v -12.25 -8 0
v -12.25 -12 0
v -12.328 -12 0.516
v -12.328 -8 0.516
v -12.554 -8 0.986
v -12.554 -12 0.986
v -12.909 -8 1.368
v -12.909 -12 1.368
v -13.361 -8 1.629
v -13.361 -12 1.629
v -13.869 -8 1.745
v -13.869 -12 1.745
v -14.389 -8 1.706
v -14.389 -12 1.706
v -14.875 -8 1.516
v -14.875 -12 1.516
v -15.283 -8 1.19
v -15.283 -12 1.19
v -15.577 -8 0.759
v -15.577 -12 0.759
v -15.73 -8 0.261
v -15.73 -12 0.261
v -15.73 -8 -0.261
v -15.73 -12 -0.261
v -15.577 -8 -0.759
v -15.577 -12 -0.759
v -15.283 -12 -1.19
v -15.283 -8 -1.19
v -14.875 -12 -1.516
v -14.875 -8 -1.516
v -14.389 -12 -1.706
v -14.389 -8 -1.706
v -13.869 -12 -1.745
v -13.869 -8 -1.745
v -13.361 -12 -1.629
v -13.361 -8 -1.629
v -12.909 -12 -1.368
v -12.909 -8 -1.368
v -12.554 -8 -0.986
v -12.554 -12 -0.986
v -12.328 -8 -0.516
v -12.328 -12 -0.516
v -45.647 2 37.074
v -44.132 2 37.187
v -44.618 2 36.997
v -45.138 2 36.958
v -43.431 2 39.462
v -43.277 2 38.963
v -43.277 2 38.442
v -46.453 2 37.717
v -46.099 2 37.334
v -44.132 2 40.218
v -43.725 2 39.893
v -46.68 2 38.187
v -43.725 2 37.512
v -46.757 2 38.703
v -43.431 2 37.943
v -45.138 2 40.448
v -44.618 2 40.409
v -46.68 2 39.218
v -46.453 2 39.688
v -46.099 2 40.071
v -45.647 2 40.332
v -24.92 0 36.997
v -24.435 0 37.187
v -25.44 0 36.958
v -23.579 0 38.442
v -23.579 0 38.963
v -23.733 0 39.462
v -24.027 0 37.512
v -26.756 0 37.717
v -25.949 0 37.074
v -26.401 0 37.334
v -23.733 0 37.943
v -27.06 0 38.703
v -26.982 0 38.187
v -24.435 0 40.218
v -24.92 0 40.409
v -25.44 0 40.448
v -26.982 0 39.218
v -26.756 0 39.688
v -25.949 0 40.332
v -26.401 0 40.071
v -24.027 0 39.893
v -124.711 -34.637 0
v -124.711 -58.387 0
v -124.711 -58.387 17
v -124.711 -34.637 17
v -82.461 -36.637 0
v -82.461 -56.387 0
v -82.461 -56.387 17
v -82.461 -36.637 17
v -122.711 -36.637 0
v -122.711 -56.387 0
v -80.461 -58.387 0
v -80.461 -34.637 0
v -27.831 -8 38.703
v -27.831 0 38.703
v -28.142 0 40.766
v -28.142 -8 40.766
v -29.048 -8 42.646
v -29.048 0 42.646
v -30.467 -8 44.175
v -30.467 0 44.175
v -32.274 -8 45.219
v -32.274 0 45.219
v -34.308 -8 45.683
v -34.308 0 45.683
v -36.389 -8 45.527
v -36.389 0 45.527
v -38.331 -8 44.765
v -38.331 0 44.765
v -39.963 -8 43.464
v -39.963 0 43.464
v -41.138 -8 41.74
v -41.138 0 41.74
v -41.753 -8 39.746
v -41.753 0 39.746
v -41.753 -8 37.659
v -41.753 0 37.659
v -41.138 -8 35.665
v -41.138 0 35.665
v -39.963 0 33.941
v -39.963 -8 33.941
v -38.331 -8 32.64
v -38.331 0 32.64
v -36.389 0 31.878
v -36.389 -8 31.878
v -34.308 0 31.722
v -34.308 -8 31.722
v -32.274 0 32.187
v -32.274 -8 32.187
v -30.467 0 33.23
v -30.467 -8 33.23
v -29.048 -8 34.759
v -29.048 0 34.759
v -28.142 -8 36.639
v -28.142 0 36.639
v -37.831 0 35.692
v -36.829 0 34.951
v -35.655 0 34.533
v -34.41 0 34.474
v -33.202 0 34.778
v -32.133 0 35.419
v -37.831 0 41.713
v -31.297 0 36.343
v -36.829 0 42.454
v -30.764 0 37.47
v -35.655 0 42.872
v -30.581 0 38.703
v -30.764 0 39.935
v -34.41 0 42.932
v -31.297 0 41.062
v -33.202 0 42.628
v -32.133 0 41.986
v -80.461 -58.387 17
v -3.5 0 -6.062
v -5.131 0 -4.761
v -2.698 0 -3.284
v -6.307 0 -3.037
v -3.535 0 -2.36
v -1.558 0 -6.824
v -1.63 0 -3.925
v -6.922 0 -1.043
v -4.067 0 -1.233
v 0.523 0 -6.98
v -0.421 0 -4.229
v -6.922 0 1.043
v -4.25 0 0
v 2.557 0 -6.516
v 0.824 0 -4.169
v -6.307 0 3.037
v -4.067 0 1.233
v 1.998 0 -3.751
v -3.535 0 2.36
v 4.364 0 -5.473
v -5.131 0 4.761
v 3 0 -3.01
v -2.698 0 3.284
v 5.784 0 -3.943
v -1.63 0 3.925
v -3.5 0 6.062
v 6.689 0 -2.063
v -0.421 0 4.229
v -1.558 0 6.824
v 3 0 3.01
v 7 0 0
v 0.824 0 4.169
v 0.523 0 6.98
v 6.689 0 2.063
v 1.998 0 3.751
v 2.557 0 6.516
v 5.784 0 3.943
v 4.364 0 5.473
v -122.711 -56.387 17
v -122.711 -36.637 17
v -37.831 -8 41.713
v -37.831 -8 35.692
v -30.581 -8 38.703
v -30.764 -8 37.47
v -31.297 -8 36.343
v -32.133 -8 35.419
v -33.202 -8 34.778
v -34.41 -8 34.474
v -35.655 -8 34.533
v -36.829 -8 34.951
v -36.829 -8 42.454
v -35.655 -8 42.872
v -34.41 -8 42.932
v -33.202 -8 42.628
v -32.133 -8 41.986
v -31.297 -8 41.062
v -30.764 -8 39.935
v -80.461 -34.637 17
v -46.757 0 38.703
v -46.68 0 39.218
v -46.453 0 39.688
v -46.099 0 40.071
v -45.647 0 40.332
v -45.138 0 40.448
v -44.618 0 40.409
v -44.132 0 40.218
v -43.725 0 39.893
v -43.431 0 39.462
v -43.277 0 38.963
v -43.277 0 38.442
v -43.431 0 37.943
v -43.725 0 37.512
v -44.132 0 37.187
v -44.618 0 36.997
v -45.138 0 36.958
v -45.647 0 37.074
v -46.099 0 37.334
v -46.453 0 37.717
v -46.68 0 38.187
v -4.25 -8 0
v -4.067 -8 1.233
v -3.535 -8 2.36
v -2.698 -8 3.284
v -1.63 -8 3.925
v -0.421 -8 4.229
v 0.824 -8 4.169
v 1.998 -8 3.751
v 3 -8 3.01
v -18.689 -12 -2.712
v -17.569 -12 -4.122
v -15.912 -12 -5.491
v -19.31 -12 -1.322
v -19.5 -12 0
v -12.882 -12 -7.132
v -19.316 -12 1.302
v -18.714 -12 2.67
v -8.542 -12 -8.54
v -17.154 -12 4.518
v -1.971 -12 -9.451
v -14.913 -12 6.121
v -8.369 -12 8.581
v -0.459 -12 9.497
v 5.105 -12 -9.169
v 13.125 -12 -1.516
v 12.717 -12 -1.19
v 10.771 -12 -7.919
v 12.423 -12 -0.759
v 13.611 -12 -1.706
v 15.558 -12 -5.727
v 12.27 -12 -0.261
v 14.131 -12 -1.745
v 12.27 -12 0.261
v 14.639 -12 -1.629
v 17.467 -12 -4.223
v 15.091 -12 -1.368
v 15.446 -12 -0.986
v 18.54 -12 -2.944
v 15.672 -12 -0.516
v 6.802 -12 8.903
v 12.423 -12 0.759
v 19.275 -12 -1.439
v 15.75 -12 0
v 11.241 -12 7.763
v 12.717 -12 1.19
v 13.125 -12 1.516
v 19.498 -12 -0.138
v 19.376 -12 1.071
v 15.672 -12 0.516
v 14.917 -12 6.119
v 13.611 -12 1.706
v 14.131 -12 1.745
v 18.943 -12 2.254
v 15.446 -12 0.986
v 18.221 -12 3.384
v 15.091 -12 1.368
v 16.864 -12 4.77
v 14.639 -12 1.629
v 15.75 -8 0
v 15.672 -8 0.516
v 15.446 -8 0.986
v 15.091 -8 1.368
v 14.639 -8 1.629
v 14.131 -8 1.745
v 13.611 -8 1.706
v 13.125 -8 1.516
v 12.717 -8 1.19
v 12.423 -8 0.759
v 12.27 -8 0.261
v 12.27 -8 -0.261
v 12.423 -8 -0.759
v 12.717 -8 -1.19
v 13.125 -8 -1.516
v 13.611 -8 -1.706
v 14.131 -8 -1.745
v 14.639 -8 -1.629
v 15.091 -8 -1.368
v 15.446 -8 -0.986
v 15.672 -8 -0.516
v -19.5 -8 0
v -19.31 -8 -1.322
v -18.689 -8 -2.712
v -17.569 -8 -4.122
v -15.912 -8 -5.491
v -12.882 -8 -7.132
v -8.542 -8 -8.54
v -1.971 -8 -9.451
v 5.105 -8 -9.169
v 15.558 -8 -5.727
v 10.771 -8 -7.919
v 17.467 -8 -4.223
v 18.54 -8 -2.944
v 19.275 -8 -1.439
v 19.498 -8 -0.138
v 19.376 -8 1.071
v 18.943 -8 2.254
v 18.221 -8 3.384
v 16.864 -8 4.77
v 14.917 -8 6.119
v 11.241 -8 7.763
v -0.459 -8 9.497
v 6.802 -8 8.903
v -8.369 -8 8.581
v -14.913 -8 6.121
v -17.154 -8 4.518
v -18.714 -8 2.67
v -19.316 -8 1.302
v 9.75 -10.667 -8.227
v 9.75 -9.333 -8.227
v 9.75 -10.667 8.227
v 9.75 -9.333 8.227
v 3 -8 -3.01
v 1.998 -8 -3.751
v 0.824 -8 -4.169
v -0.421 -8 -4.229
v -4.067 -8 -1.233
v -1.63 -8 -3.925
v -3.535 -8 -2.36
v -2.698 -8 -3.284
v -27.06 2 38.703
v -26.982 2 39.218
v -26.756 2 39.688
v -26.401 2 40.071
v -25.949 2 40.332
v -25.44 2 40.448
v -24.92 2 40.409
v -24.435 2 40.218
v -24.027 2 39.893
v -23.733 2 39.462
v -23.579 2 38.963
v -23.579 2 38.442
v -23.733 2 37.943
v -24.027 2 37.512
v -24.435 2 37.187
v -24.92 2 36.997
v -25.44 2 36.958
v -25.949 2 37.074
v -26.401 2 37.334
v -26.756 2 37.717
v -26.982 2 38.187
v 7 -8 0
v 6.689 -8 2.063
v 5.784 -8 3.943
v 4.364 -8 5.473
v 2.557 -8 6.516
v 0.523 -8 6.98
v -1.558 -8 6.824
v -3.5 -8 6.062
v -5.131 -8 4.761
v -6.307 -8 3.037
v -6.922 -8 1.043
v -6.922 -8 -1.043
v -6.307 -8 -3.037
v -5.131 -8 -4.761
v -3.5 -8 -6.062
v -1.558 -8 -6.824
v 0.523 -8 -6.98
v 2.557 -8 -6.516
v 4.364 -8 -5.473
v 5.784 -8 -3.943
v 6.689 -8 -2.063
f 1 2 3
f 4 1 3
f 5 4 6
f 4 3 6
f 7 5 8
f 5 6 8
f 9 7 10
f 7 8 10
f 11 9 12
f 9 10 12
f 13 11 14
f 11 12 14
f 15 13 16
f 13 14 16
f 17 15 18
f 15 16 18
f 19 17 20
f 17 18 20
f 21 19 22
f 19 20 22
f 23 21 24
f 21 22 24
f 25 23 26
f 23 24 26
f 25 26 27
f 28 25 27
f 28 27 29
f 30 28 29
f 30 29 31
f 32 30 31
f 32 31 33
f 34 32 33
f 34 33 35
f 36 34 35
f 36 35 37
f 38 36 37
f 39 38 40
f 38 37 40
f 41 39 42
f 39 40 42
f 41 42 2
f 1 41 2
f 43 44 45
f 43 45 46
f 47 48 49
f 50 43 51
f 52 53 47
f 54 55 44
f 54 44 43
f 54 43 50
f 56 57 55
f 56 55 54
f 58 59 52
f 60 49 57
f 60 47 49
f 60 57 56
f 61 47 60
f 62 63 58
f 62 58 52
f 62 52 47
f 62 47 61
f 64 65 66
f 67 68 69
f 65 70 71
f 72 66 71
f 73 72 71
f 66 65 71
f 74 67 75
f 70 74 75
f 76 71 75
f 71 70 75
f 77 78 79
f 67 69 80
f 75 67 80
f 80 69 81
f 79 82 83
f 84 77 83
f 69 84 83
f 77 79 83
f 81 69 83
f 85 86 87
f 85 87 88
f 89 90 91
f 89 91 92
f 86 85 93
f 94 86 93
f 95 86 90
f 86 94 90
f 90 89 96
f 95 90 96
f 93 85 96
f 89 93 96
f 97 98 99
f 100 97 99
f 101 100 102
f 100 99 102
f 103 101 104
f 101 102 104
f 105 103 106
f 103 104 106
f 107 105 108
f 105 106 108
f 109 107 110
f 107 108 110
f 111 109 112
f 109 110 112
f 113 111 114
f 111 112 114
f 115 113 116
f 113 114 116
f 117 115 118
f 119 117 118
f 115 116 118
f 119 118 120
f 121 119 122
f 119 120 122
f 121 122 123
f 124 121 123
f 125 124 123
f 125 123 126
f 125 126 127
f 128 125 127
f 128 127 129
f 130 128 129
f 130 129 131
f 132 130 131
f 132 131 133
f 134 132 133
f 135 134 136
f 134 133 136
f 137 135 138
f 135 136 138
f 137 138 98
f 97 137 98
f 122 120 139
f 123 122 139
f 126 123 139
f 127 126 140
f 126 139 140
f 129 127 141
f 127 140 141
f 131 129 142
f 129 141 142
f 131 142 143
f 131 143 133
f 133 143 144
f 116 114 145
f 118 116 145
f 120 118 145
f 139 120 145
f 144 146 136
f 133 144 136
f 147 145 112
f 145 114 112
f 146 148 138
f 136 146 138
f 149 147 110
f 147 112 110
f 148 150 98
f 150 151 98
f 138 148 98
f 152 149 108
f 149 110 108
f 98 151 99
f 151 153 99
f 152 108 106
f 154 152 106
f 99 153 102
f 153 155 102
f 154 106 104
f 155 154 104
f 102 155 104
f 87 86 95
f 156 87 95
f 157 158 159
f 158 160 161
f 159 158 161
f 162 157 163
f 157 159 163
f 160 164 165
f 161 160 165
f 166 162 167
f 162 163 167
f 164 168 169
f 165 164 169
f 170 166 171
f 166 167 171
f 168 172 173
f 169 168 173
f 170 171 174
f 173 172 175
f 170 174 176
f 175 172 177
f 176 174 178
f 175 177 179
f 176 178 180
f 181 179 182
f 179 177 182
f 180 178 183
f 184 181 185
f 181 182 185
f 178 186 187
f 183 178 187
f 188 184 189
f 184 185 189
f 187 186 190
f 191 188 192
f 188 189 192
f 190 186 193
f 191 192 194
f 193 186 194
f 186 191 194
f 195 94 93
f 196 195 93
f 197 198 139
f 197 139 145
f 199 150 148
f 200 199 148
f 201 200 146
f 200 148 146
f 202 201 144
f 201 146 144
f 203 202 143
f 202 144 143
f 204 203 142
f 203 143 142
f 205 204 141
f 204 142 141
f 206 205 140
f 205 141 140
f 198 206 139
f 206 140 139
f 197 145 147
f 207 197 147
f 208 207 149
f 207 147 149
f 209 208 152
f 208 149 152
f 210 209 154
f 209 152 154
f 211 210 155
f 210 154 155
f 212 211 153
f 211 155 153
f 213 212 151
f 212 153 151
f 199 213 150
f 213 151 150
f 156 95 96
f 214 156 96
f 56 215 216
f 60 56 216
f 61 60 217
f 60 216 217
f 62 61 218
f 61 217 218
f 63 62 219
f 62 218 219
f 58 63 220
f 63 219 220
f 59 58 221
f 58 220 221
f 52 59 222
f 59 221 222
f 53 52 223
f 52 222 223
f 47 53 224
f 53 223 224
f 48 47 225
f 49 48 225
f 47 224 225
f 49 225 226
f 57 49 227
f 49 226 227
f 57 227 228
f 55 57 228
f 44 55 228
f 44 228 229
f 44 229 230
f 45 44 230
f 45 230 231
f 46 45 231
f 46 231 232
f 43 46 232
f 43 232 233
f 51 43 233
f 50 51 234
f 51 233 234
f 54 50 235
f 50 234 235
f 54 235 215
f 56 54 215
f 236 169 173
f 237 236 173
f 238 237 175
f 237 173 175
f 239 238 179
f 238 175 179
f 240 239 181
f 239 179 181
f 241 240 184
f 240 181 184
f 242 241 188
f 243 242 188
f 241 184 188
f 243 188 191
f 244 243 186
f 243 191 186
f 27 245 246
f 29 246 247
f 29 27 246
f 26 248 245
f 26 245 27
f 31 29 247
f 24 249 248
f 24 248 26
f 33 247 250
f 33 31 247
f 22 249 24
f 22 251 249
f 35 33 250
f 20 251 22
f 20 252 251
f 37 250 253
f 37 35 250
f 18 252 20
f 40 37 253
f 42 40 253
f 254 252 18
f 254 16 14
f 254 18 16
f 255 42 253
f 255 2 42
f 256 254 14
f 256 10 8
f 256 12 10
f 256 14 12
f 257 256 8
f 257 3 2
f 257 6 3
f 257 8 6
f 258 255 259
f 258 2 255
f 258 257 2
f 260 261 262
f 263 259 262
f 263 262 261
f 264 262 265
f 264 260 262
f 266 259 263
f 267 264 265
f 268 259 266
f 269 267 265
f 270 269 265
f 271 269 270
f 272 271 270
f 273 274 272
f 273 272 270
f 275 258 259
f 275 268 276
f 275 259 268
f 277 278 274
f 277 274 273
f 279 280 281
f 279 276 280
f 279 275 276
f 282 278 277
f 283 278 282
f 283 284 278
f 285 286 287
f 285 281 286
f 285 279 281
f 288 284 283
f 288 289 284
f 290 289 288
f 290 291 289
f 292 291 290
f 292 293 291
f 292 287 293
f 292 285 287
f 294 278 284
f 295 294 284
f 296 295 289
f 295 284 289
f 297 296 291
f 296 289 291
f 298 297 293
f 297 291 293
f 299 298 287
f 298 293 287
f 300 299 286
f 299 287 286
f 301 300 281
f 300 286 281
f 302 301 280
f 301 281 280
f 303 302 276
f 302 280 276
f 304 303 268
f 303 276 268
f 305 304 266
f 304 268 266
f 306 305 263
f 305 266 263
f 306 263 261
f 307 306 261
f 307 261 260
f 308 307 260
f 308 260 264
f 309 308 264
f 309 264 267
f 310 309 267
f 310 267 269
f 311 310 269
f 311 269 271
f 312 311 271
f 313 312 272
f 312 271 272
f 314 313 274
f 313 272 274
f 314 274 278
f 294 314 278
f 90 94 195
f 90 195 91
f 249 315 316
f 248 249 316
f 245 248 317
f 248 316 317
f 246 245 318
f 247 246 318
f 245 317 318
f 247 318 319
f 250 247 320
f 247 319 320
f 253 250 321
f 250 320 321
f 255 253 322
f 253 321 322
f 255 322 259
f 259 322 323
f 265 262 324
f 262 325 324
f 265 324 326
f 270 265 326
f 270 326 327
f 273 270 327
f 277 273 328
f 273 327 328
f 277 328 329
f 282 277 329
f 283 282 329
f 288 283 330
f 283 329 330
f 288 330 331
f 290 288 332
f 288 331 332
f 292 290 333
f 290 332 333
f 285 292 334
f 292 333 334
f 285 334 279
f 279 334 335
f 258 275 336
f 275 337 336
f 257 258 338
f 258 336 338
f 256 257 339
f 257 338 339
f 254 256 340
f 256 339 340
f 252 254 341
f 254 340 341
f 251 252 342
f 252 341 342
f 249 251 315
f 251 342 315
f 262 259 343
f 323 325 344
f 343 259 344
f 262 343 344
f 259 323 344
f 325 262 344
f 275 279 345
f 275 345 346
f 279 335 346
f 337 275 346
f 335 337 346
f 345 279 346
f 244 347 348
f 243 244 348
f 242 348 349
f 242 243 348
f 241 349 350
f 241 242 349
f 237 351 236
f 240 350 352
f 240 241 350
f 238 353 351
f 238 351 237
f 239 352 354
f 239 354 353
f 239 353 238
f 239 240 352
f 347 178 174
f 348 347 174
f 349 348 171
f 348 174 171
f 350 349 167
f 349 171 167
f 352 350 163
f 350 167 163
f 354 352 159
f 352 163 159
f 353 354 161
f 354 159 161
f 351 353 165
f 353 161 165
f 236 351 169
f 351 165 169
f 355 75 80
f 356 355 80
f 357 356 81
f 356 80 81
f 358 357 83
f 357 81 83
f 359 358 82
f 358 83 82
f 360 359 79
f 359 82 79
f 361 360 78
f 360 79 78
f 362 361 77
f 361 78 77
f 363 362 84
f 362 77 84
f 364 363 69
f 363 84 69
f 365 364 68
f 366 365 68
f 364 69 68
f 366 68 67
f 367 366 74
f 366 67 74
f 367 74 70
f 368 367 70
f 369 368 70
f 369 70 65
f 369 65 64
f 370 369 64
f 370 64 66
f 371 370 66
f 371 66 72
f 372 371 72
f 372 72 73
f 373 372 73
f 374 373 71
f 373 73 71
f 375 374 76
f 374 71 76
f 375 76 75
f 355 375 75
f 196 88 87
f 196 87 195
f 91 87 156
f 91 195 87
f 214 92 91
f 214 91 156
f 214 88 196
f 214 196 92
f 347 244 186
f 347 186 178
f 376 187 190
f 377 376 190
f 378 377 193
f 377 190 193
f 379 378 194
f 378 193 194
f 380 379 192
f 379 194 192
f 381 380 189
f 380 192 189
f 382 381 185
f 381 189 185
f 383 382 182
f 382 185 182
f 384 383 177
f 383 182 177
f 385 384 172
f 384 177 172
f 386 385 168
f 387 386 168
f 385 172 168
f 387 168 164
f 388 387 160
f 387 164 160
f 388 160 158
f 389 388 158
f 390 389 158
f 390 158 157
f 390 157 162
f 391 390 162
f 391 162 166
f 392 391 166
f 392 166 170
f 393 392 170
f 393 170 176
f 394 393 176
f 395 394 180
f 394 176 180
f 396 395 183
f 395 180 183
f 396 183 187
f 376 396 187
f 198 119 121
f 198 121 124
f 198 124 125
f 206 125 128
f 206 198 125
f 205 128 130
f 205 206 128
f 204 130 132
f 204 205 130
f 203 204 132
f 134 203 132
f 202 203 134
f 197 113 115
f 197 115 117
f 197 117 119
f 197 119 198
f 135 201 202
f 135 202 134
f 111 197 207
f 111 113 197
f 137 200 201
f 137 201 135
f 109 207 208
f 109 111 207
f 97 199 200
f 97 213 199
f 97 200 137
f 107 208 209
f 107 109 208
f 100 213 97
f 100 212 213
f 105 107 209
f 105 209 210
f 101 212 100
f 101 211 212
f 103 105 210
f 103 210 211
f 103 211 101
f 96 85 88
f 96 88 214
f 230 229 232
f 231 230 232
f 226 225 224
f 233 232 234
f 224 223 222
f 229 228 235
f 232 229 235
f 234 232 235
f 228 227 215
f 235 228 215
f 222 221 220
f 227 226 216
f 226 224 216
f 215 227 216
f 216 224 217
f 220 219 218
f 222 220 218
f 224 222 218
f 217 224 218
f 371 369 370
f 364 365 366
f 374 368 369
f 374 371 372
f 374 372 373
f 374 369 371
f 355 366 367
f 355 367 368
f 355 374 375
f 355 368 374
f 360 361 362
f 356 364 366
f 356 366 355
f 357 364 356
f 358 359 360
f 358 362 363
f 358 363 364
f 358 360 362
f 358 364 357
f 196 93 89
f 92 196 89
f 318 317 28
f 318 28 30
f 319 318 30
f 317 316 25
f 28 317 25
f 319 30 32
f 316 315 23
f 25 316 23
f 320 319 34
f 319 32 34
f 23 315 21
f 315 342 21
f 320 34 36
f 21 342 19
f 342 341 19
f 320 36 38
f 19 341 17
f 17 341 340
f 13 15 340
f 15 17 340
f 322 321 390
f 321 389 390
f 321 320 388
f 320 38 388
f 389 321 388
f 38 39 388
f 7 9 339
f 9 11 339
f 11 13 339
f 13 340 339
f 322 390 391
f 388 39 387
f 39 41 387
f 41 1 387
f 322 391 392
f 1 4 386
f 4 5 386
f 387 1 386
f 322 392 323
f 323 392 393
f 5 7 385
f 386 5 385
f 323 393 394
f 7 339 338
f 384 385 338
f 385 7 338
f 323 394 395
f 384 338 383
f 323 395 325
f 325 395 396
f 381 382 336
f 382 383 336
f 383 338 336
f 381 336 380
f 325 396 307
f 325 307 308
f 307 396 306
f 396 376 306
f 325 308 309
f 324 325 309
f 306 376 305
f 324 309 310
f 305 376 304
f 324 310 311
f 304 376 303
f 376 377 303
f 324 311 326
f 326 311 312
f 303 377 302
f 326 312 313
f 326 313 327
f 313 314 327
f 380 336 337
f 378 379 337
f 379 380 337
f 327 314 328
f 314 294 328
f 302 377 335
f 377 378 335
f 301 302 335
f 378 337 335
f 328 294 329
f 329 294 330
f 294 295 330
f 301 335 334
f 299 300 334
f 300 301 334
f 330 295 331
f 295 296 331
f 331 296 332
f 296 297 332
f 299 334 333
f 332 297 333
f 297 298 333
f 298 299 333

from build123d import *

# Parameters (mm, degrees)
F0_R      = 7
F1_DEPTH  = 8
F3_DEPTH  = 4
F4_R      = 1.75
F5_DEPTH  = 4
F7_DEPTH  = 8
F8_W      = 44.25
F8_H      = 23.75
F8_W_2    = 40.25
F8_H_2    = 19.75
F9_DEPTH  = 17
F10_R     = 7
F11_DEPTH = 8
F12_R     = 1.75
F13_DEPTH = 2


with BuildPart() as f1:
    # F0 (on Front) → F1 (new body)
    with BuildSketch(Plane.XZ):
        Circle(F0_R)
    extrude(amount=F1_DEPTH)

    # F2 (on face) → F3 (join)
    with BuildSketch(Plane.XZ.offset(8)):
        with BuildLine():
            add(Edge.make_bspline(
                [(-19.5, 0), (-19.5, -16.4544826719), (9.75, -8.227241336), (39, 0), (9.75, 8.227241336), (-19.5, 16.4544826719), (-19.5, 0)],
                knots=[0, 0, 0, 2.0943951024, 2.0943951024, 4.1887902048, 4.1887902048, 6.2831853072, 6.2831853072, 6.2831853072], degree=2, weights=[1, 0.5, 1, 0.5, 1, 0.5, 1]))
        make_face()
    extrude(amount=F3_DEPTH)

    # F4 (on face) → F5 (cut)
    with BuildSketch(Plane.XZ.offset(12)):
        with Locations((-14, 0)):
            Circle(F4_R)
        with Locations((14, 0)):
            Circle(F4_R)
    extrude(amount=-F5_DEPTH, mode=Mode.SUBTRACT)

    # F6 (on face) → F7 (cut)
    with BuildSketch(Plane(origin=(0, 0, 0), x_dir=(-1, 0, 0), z_dir=(0, 1, 0))):
        with BuildLine():
            ThreePointArc((-3, -3.0103986447), (1.6298006013, -3.925079617), (4.25, 0))
            ThreePointArc((4.25, 0), (1.6298006013, 3.925079617), (-3, 3.0103986447))
            Line((-3, 3.0103986447), (-3, 0))
            Line((-3, 0), (-3, -3.0103986447))
        make_face()
    extrude(amount=-F7_DEPTH, mode=Mode.SUBTRACT)


with BuildPart() as f9:
    # F8 (on Top) → F9 (new body)
    with BuildSketch(Plane.XY):
        with Locations((-102.5861466527, -46.512093246)):
            Rectangle(F8_W, F8_H)
        with Locations((-102.5861466527, -46.512093246)):
            Rectangle(F8_W_2, F8_H_2, mode=Mode.SUBTRACT)
    extrude(amount=F9_DEPTH)


with BuildPart() as f11:
    # F10 (on Front) → F11 (new body)
    with BuildSketch(Plane.XZ):
        with Locations((-34.8314889967, 38.7026694899)):
            Circle(F10_R)
        with BuildLine():
            ThreePointArc((-37.8314889967, 41.7130681346), (-33.2016883954, 42.6277491069), (-30.5814889967, 38.7026694899))
            ThreePointArc((-30.5814889967, 38.7026694899), (-33.2016883954, 34.7775898728), (-37.8314889967, 35.6922708452))
            ThreePointArc((-37.8314889967, 35.6922708452), (-39.0814889967, 38.7026694899), (-37.8314889967, 41.7130681346))
        make_face(mode=Mode.SUBTRACT)
        with BuildLine():
            Line((-37.8314889967, 38.7026694899), (-37.8314889967, 41.7130681346))
            ThreePointArc((-37.8314889967, 41.7130681346), (-39.0814889967, 38.7026694899), (-37.8314889967, 35.6922708452))
            Line((-37.8314889967, 35.6922708452), (-37.8314889967, 38.7026694899))
        make_face()
    extrude(amount=F11_DEPTH)


with BuildPart() as f13:
    # F12 (on face) → F13 (new body)
    with BuildSketch(Plane(origin=(0, 0, 0), x_dir=(-1, 0, 0), z_dir=(0, 1, 0))):
        with Locations((25.309631601, 38.7026694899)):
            Circle(F12_R)
    extrude(amount=F13_DEPTH)


with BuildPart() as f13b:
    # F12 (on face) → F13, piece 2 (new body)
    with BuildSketch(Plane(origin=(0, 0, 0), x_dir=(-1, 0, 0), z_dir=(0, 1, 0))):
        with Locations((45.0074523687, 38.7026694899)):
            Circle(F12_R)
    extrude(amount=F13_DEPTH)


solid = Compound([f1.part, f9.part, f11.part, f13.part, f13b.part])
